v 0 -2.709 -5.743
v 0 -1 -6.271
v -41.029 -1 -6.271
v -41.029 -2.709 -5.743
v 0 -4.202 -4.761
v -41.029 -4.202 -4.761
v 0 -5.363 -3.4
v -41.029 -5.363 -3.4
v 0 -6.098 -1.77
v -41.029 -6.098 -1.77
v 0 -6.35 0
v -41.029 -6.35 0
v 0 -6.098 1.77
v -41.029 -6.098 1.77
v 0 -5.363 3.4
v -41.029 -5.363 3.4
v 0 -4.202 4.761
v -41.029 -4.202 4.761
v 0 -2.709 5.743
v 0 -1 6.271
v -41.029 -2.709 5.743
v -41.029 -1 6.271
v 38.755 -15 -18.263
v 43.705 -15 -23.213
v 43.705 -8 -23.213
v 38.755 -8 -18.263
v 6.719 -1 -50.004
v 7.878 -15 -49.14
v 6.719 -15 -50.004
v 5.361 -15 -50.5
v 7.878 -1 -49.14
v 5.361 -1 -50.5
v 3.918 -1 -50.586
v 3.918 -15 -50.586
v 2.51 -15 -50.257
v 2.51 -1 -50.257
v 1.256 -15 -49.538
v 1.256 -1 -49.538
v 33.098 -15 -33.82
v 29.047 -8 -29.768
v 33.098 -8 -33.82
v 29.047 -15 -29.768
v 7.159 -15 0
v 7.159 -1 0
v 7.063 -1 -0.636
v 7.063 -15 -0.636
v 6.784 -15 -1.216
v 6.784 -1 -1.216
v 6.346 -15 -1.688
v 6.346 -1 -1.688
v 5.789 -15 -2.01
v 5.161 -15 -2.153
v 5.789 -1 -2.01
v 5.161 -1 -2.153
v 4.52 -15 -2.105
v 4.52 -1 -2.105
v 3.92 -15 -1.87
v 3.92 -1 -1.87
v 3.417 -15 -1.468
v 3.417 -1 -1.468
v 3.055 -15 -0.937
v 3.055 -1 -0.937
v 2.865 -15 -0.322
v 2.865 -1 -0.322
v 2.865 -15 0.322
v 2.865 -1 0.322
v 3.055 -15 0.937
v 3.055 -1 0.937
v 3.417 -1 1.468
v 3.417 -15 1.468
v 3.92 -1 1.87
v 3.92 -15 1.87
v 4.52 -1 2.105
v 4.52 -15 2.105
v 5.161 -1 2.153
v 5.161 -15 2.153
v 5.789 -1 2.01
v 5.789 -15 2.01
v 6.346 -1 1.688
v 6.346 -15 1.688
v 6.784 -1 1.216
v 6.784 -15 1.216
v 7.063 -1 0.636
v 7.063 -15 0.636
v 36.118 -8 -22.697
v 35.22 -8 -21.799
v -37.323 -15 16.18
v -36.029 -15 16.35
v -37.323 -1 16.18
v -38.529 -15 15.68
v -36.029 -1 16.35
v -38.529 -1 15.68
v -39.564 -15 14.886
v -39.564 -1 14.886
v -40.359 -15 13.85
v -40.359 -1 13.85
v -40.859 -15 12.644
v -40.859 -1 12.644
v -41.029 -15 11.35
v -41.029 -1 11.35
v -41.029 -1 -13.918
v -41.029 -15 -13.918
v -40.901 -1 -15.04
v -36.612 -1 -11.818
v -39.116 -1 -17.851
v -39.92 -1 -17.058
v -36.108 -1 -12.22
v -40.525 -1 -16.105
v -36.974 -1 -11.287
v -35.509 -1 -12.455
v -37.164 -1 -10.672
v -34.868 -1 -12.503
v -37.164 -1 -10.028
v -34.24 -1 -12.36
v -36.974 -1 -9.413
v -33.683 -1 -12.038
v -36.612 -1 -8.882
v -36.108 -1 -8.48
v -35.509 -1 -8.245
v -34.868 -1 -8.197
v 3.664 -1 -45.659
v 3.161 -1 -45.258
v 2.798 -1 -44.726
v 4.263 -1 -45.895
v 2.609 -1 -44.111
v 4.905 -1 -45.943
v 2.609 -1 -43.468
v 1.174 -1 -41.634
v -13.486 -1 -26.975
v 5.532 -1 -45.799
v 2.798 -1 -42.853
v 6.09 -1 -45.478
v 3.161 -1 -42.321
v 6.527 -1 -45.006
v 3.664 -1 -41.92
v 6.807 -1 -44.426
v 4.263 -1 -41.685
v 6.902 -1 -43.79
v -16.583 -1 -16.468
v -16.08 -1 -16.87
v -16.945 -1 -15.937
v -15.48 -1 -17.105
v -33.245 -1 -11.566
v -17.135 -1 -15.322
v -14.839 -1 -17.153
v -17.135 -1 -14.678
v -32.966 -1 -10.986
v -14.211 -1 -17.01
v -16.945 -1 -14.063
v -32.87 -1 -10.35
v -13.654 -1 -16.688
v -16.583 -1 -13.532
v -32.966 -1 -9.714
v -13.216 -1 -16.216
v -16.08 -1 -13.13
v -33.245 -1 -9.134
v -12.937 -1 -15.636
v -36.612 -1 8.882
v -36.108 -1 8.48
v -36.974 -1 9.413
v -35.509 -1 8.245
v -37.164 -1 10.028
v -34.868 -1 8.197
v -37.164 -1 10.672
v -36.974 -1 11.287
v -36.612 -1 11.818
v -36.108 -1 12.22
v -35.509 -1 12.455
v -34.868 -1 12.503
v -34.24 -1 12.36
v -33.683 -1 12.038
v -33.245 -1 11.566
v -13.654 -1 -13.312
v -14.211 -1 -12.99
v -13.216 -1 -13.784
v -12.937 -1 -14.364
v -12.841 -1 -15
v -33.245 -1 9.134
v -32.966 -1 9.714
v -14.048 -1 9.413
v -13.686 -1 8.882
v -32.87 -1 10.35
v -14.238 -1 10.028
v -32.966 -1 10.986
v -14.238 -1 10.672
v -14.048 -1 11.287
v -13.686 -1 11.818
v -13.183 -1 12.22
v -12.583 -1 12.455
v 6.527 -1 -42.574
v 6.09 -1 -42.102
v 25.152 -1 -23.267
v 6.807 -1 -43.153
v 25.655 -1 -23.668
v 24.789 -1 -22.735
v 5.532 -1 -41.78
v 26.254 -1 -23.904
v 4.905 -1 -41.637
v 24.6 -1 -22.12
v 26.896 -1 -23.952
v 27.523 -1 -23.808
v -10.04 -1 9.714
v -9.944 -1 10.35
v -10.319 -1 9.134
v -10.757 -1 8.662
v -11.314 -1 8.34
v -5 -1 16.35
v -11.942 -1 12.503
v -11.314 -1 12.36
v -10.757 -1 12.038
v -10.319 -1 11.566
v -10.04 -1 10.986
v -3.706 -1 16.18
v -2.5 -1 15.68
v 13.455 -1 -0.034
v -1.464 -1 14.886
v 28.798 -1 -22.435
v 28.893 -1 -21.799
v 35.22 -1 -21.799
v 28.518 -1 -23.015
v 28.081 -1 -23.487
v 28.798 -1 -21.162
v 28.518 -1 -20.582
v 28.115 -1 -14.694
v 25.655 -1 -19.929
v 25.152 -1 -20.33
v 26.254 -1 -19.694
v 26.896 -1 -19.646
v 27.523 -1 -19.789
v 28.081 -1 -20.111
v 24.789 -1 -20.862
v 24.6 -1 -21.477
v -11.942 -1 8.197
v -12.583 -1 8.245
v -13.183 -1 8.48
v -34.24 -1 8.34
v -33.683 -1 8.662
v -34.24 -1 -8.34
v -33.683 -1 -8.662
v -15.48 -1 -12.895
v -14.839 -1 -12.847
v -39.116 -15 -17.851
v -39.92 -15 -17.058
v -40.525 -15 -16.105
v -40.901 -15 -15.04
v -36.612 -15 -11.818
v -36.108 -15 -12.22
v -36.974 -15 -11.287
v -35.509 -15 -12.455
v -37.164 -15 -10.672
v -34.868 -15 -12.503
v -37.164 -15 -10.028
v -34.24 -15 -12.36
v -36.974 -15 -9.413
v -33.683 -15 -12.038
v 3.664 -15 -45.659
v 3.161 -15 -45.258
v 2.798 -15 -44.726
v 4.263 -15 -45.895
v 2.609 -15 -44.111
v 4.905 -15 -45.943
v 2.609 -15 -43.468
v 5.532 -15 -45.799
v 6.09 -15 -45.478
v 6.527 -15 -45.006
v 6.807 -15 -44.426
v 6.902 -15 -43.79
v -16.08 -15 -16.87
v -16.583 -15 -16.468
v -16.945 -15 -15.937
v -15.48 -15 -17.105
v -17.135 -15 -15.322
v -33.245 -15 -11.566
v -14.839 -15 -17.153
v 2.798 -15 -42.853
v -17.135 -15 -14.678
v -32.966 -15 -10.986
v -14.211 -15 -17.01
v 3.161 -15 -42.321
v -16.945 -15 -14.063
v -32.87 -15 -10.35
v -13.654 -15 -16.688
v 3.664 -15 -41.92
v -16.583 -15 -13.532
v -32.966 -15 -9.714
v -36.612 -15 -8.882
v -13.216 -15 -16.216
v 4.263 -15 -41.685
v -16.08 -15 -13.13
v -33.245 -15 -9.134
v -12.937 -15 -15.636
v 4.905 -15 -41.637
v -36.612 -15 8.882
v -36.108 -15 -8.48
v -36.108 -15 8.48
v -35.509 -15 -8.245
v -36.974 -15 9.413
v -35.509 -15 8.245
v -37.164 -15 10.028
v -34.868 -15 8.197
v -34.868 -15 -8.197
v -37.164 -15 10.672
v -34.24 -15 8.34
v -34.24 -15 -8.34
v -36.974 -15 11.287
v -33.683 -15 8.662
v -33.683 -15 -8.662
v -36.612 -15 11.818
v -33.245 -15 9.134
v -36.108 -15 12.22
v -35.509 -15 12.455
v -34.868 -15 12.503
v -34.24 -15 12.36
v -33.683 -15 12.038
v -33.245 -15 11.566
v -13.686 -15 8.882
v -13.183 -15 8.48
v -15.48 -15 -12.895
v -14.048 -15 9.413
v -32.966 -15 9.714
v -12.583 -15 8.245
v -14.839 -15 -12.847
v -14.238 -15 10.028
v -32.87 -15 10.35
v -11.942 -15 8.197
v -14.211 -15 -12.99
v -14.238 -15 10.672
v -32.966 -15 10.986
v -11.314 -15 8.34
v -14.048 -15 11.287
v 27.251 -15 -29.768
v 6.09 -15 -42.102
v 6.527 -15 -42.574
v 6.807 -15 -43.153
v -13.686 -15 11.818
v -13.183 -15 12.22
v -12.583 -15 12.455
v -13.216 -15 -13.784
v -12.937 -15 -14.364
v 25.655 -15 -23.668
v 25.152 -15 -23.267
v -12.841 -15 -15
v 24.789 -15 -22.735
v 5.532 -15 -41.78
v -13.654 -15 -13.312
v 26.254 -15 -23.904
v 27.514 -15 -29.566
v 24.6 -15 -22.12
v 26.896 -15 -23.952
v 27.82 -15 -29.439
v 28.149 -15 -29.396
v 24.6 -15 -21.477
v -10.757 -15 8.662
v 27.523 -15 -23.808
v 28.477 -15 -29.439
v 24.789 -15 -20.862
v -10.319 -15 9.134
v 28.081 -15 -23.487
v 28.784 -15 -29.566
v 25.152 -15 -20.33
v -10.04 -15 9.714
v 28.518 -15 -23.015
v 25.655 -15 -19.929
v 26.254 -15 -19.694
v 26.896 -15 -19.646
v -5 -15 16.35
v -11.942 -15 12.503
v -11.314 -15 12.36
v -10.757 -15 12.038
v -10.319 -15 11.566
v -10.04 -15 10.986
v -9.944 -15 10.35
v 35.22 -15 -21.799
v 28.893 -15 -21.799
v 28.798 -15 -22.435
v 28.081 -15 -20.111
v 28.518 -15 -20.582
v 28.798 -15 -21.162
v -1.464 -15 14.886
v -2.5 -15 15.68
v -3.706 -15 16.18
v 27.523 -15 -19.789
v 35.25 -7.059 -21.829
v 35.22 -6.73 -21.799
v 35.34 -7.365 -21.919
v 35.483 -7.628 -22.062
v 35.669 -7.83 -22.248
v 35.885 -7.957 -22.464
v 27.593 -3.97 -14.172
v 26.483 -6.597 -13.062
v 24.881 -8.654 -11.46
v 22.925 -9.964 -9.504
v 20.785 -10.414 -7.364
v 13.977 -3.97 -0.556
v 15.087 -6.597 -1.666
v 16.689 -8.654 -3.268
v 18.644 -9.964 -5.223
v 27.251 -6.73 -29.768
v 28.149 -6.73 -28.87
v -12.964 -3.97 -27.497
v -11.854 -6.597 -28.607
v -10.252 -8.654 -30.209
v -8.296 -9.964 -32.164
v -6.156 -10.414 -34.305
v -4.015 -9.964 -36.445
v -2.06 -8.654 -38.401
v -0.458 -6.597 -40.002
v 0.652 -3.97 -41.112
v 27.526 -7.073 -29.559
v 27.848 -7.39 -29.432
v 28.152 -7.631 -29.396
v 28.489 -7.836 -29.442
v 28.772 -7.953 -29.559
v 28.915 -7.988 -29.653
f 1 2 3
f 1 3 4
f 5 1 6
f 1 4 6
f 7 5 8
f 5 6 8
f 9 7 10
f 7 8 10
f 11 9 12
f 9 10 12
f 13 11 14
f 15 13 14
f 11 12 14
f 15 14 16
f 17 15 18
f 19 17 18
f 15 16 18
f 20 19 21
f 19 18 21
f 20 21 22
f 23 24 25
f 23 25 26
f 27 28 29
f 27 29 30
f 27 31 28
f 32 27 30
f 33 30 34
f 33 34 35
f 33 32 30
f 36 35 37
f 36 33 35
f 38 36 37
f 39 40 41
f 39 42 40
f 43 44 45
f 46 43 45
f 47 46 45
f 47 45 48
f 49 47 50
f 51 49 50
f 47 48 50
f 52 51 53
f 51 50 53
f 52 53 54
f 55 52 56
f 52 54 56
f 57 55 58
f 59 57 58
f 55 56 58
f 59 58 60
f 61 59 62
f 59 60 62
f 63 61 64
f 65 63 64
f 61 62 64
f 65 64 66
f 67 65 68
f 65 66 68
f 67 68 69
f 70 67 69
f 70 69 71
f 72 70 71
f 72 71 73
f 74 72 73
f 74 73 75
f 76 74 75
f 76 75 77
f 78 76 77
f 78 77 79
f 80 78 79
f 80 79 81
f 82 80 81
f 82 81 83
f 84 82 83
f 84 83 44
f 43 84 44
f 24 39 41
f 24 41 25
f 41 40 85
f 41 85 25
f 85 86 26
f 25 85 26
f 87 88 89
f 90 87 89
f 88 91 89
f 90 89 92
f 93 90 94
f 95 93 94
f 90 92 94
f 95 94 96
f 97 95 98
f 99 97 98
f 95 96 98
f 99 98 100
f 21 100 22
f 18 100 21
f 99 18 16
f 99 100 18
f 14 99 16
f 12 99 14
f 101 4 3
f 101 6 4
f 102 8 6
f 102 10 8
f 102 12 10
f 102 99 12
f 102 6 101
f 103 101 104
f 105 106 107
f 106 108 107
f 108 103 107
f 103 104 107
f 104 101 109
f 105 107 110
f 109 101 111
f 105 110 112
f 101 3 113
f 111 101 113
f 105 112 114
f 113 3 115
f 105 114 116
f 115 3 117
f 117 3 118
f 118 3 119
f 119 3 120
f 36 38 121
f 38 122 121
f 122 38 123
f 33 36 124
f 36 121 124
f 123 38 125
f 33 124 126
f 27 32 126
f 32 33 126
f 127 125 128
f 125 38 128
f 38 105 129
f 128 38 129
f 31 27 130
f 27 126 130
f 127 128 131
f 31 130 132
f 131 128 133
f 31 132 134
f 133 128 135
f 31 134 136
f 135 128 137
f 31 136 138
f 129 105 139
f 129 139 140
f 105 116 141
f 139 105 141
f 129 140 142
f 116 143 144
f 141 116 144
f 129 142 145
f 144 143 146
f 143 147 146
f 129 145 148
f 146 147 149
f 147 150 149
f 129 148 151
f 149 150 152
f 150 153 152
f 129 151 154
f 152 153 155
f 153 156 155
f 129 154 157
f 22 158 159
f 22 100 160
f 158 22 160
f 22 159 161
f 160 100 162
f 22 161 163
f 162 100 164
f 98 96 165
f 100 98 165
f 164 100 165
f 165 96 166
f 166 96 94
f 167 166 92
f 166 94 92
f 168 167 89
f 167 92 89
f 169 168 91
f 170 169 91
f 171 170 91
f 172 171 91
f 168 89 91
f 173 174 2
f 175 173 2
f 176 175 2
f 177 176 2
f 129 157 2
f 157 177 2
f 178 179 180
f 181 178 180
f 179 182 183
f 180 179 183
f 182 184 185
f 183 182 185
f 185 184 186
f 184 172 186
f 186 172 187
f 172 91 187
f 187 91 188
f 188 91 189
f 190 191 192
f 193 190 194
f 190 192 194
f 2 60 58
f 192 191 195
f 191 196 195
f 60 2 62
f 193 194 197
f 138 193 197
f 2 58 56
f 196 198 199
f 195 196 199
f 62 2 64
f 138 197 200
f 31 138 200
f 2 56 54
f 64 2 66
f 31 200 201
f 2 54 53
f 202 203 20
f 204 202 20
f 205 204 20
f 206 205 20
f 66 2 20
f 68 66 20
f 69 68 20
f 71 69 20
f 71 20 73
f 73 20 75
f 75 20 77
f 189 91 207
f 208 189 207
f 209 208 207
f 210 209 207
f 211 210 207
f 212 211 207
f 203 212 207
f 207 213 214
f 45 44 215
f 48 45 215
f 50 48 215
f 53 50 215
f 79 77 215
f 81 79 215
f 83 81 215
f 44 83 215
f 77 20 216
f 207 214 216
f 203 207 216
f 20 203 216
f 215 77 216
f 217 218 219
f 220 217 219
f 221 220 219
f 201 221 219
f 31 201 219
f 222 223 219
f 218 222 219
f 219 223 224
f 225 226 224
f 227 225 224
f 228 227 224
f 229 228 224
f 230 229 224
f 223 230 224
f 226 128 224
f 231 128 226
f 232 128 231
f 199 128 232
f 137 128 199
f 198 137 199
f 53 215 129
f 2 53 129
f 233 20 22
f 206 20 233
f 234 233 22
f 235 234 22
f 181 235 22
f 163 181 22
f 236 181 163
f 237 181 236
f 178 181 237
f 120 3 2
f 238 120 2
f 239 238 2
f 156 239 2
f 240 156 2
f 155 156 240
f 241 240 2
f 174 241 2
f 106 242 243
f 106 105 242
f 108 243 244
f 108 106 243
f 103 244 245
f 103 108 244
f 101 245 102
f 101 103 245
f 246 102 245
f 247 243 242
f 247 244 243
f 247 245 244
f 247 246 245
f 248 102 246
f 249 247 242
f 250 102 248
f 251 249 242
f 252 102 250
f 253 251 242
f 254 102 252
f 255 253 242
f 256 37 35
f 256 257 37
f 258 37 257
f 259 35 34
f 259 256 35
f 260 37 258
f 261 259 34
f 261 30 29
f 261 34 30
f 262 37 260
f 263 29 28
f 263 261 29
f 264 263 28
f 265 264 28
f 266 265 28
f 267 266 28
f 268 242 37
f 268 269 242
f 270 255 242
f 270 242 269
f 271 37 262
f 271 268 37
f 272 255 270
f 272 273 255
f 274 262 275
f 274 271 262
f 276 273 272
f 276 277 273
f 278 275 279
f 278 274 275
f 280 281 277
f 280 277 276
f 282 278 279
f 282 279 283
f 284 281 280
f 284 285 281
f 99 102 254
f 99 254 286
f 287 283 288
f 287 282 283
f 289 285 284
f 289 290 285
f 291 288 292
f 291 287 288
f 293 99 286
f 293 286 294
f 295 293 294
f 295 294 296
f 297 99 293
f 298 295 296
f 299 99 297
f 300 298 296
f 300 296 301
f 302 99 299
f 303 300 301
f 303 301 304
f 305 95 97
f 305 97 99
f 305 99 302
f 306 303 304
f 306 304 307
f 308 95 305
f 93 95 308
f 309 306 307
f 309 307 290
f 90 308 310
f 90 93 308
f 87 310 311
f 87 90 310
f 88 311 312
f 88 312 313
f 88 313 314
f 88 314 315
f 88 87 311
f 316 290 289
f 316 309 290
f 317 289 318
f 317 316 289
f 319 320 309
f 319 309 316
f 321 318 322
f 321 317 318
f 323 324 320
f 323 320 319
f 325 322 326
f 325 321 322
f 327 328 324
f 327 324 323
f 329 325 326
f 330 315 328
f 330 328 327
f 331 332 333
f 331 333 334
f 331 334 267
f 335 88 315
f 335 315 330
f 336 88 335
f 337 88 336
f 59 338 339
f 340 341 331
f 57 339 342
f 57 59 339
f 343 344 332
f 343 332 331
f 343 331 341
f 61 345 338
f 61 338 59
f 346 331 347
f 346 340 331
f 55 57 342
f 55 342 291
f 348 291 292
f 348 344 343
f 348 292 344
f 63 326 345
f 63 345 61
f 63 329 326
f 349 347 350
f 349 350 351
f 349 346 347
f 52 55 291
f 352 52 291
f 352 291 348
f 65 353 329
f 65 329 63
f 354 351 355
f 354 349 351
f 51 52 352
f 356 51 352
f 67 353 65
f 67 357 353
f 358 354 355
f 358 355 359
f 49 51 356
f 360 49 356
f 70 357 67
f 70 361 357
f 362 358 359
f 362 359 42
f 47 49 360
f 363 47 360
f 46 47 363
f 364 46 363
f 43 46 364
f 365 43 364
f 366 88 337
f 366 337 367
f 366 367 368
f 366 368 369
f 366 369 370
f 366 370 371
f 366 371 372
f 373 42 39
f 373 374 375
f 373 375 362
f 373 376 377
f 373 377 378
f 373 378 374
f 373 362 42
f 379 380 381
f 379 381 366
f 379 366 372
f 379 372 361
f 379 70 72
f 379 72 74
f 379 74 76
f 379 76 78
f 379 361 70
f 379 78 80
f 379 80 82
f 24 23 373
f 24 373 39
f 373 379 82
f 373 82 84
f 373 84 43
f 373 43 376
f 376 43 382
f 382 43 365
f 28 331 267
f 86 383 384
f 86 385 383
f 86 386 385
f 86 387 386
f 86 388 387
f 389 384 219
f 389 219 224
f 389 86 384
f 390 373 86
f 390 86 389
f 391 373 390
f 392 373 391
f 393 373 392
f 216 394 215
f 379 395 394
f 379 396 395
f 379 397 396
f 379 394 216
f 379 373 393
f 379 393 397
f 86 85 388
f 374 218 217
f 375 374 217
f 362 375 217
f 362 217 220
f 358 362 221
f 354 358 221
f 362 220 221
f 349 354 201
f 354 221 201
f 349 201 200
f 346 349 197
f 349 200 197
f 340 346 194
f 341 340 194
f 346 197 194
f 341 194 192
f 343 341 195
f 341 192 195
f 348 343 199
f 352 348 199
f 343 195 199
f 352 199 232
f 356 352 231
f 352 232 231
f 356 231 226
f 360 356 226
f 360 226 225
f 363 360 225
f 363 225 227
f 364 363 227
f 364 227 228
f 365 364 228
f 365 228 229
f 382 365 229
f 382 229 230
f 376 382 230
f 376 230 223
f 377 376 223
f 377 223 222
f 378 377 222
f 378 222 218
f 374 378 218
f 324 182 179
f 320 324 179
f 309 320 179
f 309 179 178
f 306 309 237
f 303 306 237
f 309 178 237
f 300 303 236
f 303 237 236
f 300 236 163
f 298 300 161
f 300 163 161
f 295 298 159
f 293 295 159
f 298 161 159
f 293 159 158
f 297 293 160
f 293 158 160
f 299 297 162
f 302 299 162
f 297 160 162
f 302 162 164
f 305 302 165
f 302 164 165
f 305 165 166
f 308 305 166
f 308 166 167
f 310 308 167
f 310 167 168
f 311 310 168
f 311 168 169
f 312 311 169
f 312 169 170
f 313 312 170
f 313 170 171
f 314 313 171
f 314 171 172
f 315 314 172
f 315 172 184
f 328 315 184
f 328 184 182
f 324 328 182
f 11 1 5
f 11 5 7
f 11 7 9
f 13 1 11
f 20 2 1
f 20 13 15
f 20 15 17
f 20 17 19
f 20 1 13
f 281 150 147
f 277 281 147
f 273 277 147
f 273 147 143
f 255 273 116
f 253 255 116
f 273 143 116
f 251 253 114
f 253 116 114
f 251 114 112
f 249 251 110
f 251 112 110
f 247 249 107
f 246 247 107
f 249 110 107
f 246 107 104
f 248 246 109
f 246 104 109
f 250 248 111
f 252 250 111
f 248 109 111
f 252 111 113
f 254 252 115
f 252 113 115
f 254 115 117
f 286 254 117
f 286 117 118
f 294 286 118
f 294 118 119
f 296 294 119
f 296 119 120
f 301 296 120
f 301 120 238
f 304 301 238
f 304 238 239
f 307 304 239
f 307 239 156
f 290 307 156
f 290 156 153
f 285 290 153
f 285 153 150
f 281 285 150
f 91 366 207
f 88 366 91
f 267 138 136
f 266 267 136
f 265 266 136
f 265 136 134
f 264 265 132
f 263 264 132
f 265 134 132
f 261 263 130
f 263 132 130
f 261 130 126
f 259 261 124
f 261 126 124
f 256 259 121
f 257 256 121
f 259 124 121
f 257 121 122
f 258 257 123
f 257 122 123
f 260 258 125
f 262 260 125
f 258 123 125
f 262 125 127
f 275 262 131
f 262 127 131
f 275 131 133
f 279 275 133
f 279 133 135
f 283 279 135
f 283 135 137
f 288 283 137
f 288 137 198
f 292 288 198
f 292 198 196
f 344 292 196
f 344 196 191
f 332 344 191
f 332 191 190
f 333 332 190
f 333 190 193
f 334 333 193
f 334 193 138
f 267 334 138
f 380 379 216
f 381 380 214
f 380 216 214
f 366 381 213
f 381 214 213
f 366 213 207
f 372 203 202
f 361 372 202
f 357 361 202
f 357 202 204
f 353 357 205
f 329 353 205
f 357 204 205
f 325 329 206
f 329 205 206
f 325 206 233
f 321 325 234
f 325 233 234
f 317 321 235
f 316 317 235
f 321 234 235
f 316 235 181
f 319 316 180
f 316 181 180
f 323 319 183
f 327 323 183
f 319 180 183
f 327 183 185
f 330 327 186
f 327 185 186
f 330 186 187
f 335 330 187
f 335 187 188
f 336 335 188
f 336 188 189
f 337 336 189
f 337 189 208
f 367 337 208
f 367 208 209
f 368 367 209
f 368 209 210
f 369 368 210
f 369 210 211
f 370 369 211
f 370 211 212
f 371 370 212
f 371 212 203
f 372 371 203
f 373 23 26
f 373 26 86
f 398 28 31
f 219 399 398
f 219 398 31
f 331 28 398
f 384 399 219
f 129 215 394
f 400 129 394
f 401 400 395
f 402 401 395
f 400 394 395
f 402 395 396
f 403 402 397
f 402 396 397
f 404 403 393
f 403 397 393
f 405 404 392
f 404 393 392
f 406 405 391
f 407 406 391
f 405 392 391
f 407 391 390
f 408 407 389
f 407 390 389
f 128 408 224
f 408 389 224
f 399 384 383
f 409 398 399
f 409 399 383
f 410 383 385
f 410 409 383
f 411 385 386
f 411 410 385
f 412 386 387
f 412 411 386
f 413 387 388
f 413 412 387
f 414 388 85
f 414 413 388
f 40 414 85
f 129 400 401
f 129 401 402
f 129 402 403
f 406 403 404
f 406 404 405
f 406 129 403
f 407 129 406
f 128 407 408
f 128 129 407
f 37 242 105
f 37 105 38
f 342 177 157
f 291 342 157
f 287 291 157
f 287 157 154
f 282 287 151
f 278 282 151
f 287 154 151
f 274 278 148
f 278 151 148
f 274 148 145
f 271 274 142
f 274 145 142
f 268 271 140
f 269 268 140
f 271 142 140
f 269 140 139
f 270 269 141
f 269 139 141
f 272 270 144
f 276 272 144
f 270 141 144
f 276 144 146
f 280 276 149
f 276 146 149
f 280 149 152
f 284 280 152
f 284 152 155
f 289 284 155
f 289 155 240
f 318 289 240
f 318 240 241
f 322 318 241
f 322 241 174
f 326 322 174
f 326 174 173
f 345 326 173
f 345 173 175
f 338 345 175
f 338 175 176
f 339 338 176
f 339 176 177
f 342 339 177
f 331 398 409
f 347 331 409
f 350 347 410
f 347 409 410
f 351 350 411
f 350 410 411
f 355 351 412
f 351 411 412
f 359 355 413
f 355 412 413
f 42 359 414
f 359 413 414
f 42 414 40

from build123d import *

# Parameters (mm, degrees)
EXTRUDE_1_DEPTH        = 14
EXTRUDE_2_DEPTH        = 7
CUT_EXTRUDE_1_DEPTH    = 41.028932
CUT_EXTRUDE_2_DEPTH    = 38.1
HOLE_WIZARD_M4_1_D     = 4.318
HOLE_WIZARD_M4_1_DEPTH = 14
FILLET_1_R             = 5
FILLET_3_R             = 1.27
FILLET_4_R             = 1.27


with BuildPart() as part:
    # 草图1 → 凸台-拉伸1 (new body)
    with BuildSketch(Plane.XZ.offset(15)):
        Polygon((4.743453, -52.27499), (35.219756, -21.798688), (-2.928932, 16.35), (-41.028932, 16.35), (-41.028932, -16.35), align=None)
    extrude(amount=-EXTRUDE_1_DEPTH)

    # 草图2 → 凸台-拉伸2 (add)
    with BuildSketch(Plane.XZ.offset(15)):
        Polygon((43.705037, -23.212901), (38.75529, -18.263154), (35.219756, -21.798688), (28.148688, -28.869756), (33.098435, -33.819503), align=None)
    extrude(amount=-EXTRUDE_2_DEPTH)

    # 草图3 → 切除-拉伸1 (cut)
    with BuildSketch(Plane.ZY.offset(41.028932)):
        with BuildLine():
            Line((6.270766, -1), (-6.270766, -1))
            ThreePointArc((-6.270766, -1), (0, -6.35), (6.270766, -1))
        make_face()
    extrude(amount=-CUT_EXTRUDE_1_DEPTH, mode=Mode.SUBTRACT)

    # 草图4 → 切除-拉伸2 (cut)
    with BuildSketch(Plane(origin=(6.710534, 0, 6.710534), x_dir=(0.707107, 0, -0.707107), z_dir=(0.707107, 0, 0.707107))):
        with BuildLine():
            Line((30.270005, -1), (9.538252, -1))
            ThreePointArc((9.538252, -1), (19.904128, -10.414), (30.270005, -1))
        make_face()
    extrude(amount=-CUT_EXTRUDE_2_DEPTH, mode=Mode.SUBTRACT)

    # M4 间隙孔1
    with Locations(Plane(origin=(0, -15, 0), x_dir=(-1, 0, 0), z_dir=(0, -1, 0))):
        with Locations((35.028932, -10.35), (-5, 0), (15, 15), (12.103043, -10.35), (35.028932, 10.35), (-4.743453, 43.789709), (-26.734474, 21.798688)):
            Hole(HOLE_WIZARD_M4_1_D / 2, depth=HOLE_WIZARD_M4_1_DEPTH)

    # 圆角1
    fillet_1_edges = [part.edges().sort_by_distance(p)[0] for p in [
        (-41.028932, -8, -16.35),
        (-41.028932, -8, 16.35),
        (-2.928932, -8, 16.35),
        (4.743453, -8, -52.27499),
    ]]
    fillet(fillet_1_edges, radius=FILLET_1_R)

    # 圆角3
    fillet_3_edges = [part.edges().sort_by_distance(p)[0] for p in [
        (31.684222, -8, -25.334222),
    ]]
    fillet(fillet_3_edges, radius=FILLET_3_R)

    # 圆角4
    fillet_4_edges = [part.edges().sort_by_distance(p)[0] for p in [
        (28.148688, -11.5, -28.869756),
    ]]
    fillet(fillet_4_edges, radius=FILLET_4_R)


solid = part.part
